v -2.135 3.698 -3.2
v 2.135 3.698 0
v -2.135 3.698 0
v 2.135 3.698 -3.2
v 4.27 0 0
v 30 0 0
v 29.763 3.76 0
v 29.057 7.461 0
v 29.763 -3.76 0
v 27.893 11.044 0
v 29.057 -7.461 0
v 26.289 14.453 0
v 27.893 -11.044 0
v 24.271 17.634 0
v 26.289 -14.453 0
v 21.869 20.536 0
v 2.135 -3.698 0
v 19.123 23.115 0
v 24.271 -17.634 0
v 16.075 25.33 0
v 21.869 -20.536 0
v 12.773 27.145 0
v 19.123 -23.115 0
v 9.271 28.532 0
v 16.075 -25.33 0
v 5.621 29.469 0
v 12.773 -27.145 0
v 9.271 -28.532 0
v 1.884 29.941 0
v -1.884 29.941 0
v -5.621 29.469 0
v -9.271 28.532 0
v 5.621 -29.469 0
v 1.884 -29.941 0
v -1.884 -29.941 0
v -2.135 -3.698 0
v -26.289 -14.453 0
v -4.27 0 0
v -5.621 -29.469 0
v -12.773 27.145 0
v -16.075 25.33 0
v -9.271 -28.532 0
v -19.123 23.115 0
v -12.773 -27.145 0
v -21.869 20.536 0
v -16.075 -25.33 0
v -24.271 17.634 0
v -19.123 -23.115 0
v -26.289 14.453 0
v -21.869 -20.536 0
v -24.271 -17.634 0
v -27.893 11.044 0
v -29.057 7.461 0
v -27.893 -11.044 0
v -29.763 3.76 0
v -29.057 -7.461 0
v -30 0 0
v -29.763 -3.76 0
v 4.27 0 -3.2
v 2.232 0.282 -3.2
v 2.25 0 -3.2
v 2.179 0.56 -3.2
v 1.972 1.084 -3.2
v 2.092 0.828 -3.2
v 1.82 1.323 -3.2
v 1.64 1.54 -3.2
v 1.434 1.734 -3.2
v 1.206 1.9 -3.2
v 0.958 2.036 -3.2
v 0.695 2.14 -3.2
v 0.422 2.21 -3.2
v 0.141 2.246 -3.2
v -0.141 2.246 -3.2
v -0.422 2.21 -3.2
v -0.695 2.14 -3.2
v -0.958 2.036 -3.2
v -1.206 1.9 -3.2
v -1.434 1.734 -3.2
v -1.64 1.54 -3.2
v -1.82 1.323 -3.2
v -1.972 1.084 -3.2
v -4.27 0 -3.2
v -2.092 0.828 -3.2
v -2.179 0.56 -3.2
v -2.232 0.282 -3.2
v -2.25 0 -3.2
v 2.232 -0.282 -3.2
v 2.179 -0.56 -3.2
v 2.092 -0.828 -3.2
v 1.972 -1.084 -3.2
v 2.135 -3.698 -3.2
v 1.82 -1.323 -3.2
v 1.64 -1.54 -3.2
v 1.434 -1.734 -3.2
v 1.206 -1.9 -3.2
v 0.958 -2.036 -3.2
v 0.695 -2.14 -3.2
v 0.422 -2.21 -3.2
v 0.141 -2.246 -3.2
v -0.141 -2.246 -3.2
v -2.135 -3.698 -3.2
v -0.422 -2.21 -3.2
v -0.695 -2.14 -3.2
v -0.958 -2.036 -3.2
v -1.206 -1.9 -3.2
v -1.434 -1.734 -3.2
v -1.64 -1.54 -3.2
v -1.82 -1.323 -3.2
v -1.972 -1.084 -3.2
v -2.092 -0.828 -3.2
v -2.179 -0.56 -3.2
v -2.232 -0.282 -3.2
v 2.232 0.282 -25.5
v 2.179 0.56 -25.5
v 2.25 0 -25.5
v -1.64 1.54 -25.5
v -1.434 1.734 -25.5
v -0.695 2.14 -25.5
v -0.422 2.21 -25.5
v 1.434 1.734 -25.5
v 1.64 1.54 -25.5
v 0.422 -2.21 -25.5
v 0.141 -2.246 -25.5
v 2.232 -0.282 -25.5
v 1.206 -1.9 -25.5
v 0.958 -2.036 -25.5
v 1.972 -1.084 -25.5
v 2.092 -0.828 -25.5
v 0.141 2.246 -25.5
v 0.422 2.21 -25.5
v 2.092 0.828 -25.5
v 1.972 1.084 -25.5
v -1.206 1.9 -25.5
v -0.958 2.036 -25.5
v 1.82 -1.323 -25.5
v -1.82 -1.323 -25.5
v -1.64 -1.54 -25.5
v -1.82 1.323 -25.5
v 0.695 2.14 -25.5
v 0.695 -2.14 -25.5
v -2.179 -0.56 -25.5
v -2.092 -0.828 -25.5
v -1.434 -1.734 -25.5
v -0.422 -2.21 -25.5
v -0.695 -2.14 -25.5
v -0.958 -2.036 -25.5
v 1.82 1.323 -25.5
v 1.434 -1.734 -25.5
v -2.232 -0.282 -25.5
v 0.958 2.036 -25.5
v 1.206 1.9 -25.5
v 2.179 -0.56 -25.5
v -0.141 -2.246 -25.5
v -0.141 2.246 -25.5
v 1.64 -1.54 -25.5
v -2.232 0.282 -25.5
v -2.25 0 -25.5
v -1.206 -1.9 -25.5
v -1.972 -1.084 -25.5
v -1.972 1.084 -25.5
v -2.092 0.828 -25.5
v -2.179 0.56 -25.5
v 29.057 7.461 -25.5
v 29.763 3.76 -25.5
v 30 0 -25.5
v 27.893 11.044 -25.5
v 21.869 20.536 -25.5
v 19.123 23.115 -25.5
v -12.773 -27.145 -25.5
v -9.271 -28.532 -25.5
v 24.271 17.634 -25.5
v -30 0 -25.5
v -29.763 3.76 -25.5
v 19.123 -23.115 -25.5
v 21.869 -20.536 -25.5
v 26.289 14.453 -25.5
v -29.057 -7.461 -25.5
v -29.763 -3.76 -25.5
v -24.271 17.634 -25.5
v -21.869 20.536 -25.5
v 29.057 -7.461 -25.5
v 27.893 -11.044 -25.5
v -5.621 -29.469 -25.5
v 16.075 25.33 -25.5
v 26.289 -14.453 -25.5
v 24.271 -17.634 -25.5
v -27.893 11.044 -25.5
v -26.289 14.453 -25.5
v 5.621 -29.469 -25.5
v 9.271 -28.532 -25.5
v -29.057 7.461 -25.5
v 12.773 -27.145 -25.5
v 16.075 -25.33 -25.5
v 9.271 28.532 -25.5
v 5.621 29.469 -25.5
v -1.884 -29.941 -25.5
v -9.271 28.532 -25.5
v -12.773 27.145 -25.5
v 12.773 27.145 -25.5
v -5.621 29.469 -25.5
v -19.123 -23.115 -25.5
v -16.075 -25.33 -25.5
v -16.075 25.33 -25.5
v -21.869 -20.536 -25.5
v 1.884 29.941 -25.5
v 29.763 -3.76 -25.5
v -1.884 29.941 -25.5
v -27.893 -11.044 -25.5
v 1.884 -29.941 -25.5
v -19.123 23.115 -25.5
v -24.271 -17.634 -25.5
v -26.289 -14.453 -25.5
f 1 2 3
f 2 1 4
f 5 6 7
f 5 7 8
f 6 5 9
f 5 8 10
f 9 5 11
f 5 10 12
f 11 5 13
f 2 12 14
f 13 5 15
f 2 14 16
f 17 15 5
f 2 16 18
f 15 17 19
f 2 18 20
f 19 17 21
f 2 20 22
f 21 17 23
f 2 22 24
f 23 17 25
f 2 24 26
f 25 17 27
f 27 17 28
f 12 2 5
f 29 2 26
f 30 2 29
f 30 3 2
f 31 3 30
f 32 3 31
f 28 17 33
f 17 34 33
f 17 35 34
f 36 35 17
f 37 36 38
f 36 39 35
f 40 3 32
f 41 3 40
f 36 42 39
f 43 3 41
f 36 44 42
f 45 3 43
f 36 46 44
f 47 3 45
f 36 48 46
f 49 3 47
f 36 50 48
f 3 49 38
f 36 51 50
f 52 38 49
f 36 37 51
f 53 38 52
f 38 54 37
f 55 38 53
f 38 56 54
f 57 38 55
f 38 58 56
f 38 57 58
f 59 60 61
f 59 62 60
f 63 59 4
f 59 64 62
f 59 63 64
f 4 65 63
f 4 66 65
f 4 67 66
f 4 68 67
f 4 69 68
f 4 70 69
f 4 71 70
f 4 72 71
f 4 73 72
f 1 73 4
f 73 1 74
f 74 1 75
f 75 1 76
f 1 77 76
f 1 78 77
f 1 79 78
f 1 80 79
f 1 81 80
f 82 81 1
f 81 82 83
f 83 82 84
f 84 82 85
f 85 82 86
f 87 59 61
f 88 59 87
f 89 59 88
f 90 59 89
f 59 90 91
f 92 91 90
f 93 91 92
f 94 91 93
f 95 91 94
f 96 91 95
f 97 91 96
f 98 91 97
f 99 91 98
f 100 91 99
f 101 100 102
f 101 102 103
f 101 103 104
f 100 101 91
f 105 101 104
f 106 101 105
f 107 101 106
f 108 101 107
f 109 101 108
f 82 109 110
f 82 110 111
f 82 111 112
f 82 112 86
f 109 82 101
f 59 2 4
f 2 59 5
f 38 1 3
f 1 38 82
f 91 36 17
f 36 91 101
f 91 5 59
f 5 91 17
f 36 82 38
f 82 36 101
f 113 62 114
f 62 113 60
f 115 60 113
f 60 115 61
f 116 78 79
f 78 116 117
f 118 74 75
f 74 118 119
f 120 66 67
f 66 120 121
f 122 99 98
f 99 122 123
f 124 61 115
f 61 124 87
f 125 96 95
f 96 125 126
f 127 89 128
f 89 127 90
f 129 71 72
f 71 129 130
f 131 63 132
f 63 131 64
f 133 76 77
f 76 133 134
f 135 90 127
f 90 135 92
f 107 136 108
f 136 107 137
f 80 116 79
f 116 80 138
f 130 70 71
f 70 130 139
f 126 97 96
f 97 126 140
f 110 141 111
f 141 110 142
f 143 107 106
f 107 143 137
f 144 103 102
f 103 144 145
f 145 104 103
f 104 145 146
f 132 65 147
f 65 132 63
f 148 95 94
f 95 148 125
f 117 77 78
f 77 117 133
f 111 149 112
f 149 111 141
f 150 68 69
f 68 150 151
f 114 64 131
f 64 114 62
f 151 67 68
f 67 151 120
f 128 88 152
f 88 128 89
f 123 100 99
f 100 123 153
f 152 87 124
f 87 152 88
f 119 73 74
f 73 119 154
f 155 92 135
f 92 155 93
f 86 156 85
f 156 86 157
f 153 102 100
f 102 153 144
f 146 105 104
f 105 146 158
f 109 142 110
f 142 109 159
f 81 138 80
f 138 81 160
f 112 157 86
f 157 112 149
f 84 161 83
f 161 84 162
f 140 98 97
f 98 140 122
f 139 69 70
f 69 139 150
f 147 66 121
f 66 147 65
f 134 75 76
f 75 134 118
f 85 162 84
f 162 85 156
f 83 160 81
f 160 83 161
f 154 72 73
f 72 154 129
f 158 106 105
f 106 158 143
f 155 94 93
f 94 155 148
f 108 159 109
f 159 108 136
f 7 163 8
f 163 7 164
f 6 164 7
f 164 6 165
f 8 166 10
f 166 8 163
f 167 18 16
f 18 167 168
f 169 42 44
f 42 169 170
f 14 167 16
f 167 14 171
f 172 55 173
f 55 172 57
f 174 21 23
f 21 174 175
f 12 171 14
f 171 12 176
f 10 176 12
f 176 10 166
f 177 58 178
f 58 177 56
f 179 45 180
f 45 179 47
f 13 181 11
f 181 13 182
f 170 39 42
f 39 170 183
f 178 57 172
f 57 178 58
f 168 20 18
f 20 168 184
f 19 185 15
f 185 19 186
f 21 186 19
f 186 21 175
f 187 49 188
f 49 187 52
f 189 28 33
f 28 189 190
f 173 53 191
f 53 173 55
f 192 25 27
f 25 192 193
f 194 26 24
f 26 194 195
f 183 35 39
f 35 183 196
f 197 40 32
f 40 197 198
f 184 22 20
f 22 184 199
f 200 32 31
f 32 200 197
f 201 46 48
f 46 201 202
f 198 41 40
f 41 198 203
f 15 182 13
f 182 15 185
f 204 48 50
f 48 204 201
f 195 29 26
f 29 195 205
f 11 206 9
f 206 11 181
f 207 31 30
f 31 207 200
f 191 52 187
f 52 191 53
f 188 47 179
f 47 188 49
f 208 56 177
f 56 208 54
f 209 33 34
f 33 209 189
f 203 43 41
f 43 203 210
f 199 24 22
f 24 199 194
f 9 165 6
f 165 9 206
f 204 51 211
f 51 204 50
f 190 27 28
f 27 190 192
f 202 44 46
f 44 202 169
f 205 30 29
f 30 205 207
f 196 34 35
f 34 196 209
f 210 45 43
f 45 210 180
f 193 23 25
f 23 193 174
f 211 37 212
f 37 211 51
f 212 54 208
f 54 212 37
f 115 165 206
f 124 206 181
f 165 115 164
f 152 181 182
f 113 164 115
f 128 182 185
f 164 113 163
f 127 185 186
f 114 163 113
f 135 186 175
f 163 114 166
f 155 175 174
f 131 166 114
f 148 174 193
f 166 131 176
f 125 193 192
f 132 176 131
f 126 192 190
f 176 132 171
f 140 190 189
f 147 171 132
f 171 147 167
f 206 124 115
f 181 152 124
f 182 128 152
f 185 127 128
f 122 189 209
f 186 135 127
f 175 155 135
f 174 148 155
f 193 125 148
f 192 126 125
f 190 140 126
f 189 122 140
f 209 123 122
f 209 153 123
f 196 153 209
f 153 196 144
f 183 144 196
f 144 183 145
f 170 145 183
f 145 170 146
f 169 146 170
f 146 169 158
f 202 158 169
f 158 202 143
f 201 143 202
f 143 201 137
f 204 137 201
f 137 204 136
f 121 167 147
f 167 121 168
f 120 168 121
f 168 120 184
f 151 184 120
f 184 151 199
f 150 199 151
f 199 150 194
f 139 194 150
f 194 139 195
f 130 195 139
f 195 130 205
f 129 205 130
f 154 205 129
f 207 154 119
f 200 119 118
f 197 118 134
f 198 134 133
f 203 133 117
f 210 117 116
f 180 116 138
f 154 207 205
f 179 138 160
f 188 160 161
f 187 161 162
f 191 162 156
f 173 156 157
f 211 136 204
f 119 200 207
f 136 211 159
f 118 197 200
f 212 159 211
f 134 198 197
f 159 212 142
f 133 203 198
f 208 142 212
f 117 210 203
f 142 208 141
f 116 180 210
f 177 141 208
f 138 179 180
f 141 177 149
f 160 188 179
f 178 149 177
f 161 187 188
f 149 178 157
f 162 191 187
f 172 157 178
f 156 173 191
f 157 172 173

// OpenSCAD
$fn = 50;

difference() {
	union() {
		translate(v = [0, 0, -25.5]) {
			cylinder(h = 25.5, r = 30.0);
		}
	}
	union() {
		translate(v = [0, 0, 0]) {
			rotate(a = [0, 0, 0]) {
				difference() {
					union() {
						translate(v = [0, 0, -3.2]) {
							linear_extrude(height = 3.2) {
								polygon(points = [[4.2698, 0.0], [2.1349000000000005, 3.697755269078796], [-2.134899999999999, 3.6977552690787965], [-4.2698, 5.228996902999369e-16], [-2.134900000000002, -3.6977552690787956], [2.1348999999999974, -3.697755269078798]]);
							}
						}
					}
					union();
				}
			}
		}
		#translate(v = [0, 0, -100.0]) {
			cylinder(h = 200, r = 2.25);
		}
	}
}
